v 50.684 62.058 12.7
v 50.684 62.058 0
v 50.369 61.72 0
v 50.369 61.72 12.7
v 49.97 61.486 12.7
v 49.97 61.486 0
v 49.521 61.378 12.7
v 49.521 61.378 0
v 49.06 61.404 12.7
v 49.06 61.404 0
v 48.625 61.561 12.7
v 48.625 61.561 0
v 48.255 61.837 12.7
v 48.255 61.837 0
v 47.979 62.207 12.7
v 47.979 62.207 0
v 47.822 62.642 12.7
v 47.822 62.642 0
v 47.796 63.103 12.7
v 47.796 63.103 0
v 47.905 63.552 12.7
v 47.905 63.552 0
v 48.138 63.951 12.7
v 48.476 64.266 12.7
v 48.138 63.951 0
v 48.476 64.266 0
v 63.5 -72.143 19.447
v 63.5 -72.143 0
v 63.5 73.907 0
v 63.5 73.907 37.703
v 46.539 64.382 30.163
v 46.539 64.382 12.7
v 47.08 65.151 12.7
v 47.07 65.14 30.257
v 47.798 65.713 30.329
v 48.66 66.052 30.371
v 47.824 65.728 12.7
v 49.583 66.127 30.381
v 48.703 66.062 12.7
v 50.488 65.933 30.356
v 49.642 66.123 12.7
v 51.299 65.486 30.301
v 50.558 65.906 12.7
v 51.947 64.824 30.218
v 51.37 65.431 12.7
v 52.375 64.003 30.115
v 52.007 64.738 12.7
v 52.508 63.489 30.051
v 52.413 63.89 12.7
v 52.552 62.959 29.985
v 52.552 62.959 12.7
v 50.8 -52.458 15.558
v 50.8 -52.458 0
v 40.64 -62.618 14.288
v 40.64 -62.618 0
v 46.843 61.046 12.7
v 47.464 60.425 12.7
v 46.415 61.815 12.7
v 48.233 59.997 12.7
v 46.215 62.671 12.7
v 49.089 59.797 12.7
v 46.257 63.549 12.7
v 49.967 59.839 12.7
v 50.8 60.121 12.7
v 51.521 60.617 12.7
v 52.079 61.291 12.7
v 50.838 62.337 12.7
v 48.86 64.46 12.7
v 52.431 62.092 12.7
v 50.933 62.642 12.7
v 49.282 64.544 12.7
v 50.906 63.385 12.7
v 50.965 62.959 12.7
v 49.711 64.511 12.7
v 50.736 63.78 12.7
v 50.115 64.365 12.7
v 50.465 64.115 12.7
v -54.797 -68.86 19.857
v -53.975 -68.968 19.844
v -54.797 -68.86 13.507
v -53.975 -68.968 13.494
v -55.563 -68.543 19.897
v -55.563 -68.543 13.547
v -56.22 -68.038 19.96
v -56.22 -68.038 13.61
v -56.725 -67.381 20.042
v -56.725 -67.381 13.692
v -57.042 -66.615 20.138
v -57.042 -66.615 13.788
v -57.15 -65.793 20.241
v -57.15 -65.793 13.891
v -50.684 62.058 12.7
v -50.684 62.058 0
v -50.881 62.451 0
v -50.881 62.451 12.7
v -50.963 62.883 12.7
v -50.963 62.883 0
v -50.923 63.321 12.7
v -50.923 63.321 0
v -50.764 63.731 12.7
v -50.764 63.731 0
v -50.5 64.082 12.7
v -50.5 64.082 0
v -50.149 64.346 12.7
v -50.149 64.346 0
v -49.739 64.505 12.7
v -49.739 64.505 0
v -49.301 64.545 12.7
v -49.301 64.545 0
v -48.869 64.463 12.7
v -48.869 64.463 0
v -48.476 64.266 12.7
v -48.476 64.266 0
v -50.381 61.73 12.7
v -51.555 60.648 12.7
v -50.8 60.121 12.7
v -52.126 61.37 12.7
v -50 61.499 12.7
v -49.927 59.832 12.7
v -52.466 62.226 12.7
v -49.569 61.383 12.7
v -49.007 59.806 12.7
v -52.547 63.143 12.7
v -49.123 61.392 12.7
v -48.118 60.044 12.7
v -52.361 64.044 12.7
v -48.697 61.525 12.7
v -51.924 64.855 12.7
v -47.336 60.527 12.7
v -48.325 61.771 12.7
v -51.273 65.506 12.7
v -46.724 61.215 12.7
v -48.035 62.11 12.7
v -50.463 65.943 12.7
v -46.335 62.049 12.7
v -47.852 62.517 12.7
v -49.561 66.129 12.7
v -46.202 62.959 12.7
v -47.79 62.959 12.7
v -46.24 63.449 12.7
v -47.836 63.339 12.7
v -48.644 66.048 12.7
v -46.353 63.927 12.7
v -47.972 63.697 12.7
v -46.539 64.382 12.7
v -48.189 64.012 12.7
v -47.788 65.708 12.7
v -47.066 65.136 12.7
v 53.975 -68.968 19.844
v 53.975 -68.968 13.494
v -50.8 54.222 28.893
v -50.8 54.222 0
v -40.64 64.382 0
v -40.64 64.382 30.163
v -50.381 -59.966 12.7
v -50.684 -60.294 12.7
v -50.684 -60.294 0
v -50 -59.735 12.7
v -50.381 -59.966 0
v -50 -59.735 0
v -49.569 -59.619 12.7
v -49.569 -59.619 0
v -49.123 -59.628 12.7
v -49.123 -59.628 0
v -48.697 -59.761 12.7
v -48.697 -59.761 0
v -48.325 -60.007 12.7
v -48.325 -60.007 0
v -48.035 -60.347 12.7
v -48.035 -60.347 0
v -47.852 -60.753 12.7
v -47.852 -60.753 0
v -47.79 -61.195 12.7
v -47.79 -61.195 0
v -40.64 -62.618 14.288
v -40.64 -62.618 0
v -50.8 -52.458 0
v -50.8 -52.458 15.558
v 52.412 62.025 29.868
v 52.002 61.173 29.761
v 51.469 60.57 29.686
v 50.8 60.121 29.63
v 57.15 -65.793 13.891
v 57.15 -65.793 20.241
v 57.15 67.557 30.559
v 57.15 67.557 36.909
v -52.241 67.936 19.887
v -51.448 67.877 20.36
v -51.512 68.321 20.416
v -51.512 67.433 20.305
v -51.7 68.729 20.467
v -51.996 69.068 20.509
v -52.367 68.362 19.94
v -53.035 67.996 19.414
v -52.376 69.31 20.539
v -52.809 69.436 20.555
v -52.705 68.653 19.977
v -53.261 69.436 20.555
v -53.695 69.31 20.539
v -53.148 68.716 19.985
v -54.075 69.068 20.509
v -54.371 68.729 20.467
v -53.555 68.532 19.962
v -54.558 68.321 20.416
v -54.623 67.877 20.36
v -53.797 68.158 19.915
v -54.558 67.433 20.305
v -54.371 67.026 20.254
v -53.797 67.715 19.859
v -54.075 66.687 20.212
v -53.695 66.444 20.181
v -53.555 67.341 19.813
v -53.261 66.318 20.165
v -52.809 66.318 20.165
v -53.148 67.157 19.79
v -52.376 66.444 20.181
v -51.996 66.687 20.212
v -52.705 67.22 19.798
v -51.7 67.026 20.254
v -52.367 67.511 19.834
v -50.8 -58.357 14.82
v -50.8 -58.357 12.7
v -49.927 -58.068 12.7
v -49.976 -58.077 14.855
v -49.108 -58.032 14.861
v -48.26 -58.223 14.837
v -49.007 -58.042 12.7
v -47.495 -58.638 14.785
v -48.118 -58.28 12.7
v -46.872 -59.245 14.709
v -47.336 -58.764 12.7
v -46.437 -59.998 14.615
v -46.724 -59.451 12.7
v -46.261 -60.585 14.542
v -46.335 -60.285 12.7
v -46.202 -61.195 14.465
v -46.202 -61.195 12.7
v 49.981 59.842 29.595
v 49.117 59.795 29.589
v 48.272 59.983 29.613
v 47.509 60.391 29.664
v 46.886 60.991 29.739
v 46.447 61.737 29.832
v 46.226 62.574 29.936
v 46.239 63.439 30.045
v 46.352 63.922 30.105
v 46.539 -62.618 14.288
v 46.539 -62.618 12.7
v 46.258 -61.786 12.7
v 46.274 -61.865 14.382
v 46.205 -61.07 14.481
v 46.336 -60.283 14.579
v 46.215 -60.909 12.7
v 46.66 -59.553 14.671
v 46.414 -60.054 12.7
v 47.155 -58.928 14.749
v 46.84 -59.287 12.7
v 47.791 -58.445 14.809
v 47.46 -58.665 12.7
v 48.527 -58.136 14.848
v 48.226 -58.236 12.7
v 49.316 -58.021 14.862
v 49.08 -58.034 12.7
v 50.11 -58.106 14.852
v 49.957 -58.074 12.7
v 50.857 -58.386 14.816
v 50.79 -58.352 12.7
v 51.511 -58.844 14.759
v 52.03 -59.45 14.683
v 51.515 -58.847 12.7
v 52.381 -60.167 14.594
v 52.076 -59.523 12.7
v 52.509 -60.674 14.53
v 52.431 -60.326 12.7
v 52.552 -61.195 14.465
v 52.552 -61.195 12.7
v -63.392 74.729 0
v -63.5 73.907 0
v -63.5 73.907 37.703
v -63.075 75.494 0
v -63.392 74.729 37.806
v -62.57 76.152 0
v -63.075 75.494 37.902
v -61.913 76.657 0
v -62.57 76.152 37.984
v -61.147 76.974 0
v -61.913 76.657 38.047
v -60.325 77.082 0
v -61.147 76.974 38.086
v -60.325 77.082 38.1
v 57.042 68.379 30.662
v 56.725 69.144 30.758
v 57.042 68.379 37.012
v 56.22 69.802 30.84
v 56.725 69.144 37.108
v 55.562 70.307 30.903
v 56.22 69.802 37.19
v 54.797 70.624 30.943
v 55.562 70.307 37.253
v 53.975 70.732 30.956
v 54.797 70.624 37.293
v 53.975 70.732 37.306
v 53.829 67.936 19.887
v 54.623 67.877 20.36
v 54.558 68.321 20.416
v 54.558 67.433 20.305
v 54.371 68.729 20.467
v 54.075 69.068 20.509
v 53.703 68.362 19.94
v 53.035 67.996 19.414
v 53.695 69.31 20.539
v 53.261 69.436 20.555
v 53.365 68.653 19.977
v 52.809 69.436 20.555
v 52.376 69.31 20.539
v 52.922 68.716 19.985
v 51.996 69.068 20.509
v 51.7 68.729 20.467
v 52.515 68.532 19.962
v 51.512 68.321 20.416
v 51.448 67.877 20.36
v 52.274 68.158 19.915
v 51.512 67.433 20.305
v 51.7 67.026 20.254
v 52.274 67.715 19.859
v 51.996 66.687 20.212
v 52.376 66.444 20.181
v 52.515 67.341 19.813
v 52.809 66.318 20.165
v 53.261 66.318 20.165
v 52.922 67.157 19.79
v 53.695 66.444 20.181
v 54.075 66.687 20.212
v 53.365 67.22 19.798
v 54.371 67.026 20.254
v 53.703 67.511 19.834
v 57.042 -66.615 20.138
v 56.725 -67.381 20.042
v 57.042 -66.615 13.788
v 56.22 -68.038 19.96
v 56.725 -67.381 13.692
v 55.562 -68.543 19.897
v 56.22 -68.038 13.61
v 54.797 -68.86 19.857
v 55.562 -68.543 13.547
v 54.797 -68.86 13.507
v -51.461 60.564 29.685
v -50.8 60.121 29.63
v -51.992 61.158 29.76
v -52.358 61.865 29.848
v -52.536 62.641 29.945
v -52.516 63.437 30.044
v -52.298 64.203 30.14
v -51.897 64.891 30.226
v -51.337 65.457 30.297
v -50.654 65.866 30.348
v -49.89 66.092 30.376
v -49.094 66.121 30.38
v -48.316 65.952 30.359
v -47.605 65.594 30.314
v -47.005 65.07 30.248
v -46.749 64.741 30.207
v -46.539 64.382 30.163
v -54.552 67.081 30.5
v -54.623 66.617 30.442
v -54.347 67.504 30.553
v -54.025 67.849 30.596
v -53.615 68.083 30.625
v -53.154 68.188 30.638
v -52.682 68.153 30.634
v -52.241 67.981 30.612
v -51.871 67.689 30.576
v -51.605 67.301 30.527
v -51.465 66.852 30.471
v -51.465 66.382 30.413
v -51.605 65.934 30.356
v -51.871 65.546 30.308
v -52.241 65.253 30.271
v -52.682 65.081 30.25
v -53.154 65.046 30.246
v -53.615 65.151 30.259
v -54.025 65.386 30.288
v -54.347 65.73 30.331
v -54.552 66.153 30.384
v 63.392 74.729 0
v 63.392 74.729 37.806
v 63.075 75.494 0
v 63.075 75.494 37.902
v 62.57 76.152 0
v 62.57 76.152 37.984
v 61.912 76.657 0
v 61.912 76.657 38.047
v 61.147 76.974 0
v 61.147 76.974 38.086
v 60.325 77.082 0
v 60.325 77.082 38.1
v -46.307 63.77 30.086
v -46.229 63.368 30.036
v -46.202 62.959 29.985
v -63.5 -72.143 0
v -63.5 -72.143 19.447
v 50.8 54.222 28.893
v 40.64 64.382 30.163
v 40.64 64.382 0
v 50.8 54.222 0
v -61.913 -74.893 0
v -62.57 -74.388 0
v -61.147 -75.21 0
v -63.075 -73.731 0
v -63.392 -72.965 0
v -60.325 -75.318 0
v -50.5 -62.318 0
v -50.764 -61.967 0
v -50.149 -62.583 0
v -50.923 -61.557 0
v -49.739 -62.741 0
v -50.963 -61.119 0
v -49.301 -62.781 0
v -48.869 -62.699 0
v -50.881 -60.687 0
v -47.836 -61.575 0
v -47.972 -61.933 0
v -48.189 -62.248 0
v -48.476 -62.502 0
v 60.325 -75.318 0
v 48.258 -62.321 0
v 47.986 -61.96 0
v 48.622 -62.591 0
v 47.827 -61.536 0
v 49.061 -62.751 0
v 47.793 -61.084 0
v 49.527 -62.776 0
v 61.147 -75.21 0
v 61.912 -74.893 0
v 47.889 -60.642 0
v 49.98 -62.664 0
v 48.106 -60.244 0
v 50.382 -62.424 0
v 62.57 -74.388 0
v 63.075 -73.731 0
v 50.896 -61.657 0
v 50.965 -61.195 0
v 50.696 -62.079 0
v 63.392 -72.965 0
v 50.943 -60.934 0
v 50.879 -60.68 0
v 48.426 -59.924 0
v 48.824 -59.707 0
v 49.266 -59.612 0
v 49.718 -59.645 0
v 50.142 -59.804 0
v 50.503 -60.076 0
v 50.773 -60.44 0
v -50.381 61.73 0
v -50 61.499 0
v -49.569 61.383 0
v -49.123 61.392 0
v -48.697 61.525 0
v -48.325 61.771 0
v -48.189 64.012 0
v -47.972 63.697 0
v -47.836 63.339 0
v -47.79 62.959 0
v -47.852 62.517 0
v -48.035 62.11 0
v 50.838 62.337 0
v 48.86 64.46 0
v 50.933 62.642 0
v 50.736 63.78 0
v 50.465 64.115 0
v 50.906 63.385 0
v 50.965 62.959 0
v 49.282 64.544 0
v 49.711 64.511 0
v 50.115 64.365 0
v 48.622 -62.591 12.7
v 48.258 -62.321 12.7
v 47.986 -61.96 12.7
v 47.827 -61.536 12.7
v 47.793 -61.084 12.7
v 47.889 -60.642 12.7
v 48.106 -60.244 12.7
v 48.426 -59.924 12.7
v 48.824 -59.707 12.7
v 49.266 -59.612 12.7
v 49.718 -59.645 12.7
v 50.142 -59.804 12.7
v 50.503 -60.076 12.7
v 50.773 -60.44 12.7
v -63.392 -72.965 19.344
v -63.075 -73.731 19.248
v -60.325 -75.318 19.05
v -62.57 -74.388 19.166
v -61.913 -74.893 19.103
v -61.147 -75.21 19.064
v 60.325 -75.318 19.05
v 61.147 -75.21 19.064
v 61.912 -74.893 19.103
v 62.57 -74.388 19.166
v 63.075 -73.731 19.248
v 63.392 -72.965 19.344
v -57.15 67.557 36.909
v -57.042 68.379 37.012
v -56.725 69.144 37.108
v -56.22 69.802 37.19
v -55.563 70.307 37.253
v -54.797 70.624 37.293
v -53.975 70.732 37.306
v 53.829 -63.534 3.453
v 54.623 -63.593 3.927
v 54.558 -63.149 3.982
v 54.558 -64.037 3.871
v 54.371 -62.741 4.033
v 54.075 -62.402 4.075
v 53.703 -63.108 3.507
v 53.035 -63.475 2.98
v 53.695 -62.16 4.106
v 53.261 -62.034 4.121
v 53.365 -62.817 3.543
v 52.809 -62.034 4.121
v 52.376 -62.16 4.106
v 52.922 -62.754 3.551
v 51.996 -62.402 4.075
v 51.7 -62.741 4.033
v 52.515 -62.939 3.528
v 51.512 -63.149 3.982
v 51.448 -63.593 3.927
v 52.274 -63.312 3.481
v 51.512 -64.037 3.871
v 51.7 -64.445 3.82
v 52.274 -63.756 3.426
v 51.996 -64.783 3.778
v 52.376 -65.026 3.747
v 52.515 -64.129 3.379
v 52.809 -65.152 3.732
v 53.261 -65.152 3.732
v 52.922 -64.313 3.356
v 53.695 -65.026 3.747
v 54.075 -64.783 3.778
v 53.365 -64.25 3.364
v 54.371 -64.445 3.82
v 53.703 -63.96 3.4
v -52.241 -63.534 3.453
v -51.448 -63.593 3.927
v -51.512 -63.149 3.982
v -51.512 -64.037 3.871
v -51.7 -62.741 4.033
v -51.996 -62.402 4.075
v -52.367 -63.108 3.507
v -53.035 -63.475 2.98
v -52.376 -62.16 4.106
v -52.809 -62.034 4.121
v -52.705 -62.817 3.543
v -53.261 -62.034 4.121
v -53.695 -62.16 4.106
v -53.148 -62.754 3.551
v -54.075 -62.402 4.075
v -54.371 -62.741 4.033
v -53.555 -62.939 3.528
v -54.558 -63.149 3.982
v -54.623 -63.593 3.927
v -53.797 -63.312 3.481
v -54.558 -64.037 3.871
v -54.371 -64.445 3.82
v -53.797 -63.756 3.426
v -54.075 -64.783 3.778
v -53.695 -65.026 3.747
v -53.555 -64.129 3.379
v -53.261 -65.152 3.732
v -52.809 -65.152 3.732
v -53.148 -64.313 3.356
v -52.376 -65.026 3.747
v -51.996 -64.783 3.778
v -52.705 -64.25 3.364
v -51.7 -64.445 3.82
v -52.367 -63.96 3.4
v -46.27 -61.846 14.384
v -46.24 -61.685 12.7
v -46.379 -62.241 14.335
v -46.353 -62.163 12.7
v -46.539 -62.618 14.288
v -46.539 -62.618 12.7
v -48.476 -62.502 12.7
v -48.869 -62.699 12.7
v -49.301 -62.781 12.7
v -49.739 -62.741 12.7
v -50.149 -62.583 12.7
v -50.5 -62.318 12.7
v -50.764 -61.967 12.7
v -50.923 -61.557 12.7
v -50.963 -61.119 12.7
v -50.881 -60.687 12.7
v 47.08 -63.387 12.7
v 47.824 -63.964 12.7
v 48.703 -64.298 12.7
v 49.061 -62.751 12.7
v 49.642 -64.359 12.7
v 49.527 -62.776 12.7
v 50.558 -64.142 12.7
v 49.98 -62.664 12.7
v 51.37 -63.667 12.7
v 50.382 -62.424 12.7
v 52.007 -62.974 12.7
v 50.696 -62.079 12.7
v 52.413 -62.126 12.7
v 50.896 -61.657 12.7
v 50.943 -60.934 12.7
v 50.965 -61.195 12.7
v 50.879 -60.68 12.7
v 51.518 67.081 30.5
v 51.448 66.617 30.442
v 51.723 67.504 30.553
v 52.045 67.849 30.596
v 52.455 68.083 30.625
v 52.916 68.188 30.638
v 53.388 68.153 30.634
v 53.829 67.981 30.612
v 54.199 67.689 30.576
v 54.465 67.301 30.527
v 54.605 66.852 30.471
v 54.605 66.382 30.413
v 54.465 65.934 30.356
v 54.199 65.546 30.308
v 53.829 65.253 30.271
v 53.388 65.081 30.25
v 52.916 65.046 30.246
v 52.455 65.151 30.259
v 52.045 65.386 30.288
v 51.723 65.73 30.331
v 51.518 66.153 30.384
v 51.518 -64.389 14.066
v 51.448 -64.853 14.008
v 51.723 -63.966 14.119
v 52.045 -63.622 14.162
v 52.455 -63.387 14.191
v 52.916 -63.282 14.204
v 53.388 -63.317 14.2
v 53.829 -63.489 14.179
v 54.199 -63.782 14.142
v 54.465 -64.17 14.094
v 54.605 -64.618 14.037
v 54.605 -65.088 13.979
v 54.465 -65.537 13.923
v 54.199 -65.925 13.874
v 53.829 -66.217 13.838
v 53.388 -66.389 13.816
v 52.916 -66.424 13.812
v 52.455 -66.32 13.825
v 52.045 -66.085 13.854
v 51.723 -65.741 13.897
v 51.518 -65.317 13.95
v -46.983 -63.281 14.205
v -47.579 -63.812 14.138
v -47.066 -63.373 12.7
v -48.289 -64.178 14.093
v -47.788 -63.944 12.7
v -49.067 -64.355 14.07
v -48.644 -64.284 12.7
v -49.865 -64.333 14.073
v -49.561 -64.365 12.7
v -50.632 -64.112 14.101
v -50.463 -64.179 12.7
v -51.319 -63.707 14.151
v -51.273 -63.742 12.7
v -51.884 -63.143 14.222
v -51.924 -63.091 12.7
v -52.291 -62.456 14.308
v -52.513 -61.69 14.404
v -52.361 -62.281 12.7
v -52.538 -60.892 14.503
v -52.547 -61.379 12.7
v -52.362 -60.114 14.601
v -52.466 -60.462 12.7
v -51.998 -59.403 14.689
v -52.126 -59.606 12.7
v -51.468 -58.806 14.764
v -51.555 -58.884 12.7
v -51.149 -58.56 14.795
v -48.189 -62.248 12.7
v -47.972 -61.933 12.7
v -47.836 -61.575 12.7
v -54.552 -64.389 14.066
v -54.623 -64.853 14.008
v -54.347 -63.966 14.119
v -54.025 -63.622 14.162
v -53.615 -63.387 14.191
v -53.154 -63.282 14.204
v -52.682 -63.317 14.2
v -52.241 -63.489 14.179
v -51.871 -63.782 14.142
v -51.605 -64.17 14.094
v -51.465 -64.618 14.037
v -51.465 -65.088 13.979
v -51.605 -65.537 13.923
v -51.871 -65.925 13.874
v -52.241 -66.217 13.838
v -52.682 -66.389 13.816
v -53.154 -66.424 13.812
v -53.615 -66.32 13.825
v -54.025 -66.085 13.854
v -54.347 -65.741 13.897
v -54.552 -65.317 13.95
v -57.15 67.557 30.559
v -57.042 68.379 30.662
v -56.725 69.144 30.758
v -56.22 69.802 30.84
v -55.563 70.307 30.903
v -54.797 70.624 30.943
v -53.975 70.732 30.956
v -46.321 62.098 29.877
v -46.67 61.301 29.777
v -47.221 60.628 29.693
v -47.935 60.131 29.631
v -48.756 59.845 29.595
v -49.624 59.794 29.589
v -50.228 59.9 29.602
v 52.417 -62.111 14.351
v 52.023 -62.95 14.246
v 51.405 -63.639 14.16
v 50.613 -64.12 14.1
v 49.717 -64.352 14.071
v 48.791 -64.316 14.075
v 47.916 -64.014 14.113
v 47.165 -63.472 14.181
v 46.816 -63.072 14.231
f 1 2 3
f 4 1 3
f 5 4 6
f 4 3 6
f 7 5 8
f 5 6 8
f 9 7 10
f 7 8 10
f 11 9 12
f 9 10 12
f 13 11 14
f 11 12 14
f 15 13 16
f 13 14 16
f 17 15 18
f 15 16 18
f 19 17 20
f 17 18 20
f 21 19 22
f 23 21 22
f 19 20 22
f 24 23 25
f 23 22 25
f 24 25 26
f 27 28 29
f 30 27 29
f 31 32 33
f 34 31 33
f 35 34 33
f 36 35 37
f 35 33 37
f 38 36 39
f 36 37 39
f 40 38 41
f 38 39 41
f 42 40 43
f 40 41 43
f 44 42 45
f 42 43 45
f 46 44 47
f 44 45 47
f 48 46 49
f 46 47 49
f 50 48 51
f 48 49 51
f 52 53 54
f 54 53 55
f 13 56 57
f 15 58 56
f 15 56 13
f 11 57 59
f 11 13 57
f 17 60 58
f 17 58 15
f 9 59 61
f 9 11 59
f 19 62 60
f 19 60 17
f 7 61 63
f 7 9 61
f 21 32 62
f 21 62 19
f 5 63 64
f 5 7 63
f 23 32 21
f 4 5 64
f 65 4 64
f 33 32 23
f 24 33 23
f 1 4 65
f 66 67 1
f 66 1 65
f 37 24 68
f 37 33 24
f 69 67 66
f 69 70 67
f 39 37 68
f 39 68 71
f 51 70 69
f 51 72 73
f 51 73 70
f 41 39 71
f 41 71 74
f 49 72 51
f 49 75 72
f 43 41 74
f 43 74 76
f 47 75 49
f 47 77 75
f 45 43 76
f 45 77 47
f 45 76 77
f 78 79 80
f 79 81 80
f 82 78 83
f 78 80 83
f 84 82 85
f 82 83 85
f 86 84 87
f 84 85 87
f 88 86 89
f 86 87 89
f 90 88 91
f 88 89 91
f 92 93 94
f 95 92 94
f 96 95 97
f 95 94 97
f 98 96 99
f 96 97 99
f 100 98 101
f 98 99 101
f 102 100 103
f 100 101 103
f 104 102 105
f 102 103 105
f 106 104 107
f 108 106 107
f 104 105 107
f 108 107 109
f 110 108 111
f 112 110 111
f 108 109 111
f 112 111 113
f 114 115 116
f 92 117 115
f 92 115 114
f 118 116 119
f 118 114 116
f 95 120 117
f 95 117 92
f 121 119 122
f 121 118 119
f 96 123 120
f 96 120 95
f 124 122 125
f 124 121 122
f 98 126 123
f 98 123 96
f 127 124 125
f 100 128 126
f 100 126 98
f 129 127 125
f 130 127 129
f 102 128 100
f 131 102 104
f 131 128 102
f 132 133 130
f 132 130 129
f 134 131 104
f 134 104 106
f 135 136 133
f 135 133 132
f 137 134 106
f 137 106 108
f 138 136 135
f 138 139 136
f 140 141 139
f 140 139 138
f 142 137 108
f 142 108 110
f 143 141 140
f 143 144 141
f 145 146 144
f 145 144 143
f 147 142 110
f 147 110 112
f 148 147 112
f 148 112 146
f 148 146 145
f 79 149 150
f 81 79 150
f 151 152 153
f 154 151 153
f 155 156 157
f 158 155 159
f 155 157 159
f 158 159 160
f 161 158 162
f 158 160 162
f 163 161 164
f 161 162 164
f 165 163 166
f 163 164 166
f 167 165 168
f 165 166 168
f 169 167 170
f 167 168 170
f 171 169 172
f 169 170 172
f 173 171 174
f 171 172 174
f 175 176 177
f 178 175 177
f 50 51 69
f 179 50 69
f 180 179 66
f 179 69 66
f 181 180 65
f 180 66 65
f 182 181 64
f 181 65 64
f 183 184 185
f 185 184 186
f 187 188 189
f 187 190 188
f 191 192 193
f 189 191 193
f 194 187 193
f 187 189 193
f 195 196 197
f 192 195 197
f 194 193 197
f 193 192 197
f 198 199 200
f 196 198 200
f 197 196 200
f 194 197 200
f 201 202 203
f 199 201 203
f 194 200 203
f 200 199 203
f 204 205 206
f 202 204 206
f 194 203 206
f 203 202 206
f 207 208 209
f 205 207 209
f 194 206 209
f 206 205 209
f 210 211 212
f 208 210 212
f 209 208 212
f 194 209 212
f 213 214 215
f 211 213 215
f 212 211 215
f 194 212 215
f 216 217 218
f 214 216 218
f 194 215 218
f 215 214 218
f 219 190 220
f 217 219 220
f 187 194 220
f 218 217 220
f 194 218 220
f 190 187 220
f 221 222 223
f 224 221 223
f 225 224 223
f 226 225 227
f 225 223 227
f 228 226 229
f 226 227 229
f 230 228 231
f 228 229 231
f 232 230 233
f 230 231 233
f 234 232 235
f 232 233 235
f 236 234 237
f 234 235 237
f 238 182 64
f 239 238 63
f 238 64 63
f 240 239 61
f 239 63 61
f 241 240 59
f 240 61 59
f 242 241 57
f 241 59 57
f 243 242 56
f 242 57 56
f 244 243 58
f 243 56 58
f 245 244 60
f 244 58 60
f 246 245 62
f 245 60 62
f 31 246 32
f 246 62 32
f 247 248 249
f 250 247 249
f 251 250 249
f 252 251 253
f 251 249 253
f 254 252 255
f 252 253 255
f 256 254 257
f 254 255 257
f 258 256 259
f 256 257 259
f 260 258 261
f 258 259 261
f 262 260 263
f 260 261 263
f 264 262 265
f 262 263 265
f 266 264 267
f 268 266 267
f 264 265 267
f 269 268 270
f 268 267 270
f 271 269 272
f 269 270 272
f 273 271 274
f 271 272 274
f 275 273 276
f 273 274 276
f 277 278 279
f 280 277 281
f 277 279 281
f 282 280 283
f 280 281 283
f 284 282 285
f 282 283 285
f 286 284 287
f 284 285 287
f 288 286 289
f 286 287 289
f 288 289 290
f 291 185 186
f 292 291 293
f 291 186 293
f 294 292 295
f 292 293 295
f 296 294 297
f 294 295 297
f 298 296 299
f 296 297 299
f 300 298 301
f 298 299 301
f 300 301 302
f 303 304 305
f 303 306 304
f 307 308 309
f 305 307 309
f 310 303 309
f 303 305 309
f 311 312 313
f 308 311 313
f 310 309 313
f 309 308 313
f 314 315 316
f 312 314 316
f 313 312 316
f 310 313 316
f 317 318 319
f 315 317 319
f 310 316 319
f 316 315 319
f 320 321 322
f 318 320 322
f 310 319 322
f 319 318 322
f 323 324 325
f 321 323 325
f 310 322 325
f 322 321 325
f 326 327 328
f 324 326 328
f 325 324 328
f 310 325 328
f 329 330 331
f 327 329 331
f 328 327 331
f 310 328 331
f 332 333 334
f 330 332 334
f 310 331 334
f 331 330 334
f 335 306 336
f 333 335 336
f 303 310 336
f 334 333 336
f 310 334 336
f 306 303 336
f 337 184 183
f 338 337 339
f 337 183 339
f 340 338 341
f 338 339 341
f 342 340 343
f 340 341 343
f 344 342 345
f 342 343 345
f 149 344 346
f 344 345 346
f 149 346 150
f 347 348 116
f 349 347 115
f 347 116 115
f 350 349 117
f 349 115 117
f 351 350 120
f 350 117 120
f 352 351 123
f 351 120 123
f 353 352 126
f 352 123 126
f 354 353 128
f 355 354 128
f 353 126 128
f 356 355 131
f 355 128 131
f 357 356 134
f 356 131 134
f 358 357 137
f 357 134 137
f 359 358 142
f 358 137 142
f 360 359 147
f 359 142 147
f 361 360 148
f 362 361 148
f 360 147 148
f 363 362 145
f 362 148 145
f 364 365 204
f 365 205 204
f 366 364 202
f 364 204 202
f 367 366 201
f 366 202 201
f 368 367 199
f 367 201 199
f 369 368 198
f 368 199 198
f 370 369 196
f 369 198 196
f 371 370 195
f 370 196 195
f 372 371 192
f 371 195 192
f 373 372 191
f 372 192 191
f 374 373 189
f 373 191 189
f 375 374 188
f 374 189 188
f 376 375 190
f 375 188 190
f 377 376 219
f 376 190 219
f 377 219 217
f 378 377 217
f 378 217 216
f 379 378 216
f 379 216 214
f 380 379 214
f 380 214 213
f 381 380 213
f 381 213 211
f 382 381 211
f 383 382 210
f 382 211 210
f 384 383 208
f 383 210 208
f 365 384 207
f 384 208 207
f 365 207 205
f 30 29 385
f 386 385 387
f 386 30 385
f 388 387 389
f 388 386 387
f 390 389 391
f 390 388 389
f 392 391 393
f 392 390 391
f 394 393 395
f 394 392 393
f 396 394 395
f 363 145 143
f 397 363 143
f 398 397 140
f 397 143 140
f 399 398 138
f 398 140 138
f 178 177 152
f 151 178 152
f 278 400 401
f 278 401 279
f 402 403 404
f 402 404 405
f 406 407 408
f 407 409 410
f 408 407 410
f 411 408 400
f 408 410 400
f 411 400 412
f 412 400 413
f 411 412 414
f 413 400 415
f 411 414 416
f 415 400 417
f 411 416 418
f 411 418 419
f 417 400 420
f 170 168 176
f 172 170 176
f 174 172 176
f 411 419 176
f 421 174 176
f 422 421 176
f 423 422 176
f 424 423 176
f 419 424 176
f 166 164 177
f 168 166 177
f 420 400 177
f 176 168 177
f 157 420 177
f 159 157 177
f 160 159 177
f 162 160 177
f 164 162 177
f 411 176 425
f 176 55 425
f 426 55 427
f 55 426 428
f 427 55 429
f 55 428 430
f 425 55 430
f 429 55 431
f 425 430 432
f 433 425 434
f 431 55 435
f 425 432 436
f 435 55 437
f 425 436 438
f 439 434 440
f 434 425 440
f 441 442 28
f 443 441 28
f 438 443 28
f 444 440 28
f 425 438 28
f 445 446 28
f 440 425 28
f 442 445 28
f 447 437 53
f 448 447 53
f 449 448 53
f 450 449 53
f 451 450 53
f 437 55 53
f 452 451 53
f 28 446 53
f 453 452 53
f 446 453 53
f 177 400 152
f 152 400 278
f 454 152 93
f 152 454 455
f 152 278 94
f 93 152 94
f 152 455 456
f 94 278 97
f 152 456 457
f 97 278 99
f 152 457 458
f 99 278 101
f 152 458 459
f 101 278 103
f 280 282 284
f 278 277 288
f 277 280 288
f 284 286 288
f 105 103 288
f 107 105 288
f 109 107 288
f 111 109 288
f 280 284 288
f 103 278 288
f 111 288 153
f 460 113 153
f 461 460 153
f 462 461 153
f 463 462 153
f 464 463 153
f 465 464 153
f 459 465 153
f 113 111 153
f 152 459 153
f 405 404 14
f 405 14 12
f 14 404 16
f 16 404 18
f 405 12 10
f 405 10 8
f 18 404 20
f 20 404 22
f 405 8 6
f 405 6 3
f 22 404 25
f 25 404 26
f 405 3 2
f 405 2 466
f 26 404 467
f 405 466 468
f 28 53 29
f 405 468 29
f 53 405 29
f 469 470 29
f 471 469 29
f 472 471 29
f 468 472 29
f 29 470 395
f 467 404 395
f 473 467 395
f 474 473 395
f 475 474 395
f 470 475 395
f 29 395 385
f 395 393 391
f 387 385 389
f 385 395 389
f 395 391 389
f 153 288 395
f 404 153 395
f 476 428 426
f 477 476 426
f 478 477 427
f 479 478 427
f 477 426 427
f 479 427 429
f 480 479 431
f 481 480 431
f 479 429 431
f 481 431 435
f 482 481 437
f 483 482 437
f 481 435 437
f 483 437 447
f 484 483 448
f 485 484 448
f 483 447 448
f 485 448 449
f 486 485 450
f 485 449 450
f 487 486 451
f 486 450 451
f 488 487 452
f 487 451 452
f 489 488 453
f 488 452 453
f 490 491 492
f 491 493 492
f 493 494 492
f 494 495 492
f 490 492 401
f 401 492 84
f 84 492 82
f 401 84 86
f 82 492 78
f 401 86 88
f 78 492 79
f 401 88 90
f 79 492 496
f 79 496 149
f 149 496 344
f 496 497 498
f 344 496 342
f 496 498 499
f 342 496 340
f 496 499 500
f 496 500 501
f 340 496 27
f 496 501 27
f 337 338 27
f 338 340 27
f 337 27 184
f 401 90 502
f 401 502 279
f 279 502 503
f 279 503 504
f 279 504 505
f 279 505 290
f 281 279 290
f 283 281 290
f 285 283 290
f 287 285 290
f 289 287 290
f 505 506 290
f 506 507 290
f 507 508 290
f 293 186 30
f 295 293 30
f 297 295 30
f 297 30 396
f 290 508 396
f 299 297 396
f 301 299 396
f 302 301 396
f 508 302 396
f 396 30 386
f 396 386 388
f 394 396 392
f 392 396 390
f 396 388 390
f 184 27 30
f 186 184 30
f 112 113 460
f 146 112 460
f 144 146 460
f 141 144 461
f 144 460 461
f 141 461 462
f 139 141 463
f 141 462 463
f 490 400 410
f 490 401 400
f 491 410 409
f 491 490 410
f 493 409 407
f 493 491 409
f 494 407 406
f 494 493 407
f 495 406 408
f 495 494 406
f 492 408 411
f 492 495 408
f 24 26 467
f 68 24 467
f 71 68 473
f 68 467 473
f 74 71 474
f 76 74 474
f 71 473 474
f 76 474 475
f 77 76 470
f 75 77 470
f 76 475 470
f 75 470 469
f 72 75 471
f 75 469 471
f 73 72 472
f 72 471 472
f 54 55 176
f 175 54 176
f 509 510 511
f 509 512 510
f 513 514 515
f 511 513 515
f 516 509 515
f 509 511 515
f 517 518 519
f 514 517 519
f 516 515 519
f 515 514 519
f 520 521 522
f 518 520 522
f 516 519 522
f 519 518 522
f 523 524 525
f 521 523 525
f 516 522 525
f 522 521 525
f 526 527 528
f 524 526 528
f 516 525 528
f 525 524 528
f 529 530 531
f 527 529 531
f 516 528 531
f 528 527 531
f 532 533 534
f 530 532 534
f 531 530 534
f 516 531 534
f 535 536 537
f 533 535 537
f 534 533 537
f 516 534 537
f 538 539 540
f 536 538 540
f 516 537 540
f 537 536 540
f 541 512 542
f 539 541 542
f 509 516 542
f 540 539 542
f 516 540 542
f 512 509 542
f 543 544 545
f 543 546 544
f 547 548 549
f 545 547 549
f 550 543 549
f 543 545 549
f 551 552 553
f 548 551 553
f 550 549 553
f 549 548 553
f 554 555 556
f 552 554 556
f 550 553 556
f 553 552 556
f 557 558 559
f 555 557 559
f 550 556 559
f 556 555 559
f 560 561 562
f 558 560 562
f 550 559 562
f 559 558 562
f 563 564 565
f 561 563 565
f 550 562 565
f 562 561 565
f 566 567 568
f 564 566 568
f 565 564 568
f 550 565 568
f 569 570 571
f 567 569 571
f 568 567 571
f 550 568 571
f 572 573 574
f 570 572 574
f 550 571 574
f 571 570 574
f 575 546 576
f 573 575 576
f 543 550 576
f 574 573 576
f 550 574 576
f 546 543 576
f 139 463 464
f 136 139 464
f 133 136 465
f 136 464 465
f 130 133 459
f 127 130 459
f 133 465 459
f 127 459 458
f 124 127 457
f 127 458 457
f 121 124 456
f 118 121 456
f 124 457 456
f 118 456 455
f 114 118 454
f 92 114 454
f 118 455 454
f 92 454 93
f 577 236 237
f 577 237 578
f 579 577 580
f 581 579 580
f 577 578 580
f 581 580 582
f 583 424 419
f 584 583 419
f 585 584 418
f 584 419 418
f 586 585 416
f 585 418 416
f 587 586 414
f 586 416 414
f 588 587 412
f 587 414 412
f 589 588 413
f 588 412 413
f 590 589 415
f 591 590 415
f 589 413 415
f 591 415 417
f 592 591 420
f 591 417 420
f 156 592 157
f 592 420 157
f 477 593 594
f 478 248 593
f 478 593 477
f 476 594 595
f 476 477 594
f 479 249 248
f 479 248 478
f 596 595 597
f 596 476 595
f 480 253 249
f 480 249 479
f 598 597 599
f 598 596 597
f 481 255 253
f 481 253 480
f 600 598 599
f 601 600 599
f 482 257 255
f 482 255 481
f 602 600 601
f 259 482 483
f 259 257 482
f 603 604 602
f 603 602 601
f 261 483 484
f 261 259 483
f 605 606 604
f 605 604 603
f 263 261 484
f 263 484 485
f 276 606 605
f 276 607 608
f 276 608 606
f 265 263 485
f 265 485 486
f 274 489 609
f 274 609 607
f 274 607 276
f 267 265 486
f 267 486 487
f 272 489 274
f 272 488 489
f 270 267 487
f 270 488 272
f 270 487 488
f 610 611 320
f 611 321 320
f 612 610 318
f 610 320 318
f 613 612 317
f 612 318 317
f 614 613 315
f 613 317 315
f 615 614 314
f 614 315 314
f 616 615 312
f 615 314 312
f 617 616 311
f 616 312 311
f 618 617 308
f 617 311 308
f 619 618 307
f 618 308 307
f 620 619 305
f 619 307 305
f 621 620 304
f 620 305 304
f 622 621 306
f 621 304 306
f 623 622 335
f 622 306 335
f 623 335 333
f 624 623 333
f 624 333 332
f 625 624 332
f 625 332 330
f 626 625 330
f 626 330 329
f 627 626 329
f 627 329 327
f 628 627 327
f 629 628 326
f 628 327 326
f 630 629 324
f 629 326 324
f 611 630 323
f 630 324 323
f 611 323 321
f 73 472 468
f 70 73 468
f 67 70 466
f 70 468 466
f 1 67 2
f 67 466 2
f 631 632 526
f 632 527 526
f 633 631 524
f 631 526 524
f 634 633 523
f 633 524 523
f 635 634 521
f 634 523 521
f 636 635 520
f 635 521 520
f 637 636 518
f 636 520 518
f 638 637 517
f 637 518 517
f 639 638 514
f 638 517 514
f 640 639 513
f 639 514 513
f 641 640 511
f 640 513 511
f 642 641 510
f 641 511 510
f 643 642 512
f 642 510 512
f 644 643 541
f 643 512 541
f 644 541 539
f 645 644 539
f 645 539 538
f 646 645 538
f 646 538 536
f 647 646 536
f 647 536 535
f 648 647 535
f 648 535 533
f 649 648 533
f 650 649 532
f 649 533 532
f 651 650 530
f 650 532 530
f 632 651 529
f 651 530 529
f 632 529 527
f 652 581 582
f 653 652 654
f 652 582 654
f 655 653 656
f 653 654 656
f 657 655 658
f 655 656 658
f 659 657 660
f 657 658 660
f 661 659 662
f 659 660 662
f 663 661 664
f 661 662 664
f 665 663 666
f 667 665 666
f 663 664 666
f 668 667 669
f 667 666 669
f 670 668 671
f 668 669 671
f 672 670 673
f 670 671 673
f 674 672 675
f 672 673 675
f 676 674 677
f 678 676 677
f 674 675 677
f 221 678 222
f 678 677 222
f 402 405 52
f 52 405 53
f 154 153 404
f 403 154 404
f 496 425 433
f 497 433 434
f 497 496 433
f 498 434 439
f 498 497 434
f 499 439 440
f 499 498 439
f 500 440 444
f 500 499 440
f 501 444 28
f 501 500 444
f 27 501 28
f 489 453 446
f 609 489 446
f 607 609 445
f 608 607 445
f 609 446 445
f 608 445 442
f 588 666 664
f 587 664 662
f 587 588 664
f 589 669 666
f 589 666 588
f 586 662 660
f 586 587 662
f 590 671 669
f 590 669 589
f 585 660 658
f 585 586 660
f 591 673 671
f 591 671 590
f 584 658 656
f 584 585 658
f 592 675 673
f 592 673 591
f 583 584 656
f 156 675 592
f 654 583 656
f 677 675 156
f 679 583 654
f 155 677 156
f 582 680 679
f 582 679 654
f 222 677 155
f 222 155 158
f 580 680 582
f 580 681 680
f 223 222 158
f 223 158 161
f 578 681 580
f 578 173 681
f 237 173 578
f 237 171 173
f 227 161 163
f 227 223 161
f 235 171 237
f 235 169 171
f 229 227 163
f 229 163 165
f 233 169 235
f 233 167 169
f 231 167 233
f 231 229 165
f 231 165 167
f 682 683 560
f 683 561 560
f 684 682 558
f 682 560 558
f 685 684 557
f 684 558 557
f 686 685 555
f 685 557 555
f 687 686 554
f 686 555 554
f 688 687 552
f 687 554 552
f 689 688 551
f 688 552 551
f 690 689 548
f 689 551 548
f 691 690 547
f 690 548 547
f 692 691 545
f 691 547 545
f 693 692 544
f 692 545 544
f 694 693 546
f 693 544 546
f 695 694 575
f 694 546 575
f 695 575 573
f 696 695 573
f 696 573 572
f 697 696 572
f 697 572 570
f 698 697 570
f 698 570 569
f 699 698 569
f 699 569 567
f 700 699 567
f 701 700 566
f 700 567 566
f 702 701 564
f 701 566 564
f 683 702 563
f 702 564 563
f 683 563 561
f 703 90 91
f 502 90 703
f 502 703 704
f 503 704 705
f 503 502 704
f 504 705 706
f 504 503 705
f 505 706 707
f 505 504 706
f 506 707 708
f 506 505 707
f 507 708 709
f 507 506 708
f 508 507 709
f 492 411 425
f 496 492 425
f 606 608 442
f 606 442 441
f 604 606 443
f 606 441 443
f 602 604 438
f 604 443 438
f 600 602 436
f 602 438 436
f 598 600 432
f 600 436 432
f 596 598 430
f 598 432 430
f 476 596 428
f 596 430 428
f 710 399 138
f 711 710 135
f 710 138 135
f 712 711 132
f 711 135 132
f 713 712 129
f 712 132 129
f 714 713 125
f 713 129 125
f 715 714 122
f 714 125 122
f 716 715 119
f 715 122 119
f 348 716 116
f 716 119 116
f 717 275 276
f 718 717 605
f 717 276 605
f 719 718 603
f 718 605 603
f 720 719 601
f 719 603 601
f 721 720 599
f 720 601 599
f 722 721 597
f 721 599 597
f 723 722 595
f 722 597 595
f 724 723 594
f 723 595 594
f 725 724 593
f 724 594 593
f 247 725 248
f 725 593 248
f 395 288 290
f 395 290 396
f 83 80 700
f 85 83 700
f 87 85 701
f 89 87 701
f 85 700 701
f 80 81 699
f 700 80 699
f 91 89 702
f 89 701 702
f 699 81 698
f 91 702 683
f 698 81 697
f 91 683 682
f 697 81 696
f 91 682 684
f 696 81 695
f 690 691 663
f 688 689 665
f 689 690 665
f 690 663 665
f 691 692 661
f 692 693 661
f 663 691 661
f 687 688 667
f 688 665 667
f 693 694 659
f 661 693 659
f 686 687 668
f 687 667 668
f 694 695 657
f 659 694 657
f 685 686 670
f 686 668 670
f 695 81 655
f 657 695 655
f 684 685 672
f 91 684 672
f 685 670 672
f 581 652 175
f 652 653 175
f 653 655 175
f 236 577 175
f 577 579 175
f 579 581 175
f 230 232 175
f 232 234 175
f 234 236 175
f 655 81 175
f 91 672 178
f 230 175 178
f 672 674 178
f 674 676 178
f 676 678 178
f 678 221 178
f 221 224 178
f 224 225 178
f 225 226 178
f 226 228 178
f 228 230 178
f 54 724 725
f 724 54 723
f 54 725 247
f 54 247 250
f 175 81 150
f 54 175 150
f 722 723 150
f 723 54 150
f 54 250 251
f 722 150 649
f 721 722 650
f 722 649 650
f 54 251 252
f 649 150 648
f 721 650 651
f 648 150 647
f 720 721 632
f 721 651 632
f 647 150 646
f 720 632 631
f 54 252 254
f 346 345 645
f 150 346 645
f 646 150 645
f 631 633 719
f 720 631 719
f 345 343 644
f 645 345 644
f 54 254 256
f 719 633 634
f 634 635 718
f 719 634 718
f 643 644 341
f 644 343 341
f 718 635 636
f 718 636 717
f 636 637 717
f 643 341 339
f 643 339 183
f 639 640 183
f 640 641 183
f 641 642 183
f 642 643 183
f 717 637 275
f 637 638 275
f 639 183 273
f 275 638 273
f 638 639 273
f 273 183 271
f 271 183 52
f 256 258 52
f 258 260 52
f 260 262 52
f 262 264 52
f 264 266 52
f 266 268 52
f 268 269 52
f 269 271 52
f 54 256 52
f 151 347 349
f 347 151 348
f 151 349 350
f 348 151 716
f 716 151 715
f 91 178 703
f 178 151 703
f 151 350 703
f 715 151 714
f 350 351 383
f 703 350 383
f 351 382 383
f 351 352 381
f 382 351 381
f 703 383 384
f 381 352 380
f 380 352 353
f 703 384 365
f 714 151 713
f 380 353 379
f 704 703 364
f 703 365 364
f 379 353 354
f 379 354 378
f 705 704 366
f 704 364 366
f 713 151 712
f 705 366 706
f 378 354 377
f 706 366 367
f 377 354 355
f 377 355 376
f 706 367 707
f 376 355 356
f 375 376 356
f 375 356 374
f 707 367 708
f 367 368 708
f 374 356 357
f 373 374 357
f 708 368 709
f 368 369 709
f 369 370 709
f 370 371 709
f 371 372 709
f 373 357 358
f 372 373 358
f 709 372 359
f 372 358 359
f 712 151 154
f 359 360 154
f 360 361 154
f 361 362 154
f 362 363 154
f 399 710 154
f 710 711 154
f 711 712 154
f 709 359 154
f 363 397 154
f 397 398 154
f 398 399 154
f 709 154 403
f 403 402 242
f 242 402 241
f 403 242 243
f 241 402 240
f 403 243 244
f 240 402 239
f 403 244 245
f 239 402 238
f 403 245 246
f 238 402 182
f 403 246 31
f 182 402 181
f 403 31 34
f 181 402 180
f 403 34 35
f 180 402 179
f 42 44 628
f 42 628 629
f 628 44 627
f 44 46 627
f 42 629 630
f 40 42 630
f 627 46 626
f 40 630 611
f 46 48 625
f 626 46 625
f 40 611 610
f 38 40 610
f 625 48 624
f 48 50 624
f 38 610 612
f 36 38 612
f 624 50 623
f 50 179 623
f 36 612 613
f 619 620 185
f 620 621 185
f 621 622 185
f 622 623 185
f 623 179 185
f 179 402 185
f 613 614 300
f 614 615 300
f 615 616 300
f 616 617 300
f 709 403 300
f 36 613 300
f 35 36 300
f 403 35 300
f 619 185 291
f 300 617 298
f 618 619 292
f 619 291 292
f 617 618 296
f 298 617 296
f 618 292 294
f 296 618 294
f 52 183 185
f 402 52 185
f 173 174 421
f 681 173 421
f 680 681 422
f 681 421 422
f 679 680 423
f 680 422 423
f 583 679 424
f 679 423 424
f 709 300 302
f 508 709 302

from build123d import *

# Parameters (mm, degrees)
F0_W     = 127
F0_H     = 152.4
F0_R     = 1.5875
F1_DEPTH = 76.2
F3_DEPTH = 133.858
F4_DEPTH = 12.7
F6_START = -6.35
F6_DEPTH = 114.3
F8_D     = 3.175
F8_DEPTH = 10.16
F8_TIP   = 0.9538662327
F9_R     = 3.175


with BuildPart() as f1:
    # F0 (on Top) → F1 (new body)
    with BuildSketch(Plane.XY):
        with Locations((-4.7115e-06, 0.8819496805)):
            Rectangle(F0_W, F0_H)
        with BuildLine():
            ThreePointArc((-57.1500047115, 67.5569496805), (-56.2200687418, 69.8020137107), (-53.9750047115, 70.7319496805))
            Line((-53.9750047115, 70.7319496805), (53.9749952885, 70.7319496805))
            ThreePointArc((53.9749952885, 70.7319496805), (56.2200593188, 69.8020137107), (57.1499952885, 67.5569496805))
            Line((57.1499952885, 67.5569496805), (57.1499952885, -65.7930503195))
            ThreePointArc((57.1499952885, -65.7930503195), (56.2200593188, -68.0381143498), (53.9749952885, -68.9680503195))
            Line((53.9749952885, -68.9680503195), (-53.9750047115, -68.9680503195))
            ThreePointArc((-53.9750047115, -68.9680503195), (-56.2200687418, -68.0381143498), (-57.1500047115, -65.7930503195))
            Line((-57.1500047115, -65.7930503195), (-57.1500047115, 67.5569496805))
        make_face(mode=Mode.SUBTRACT)
        with BuildLine():
            Line((53.9749952885, 70.7319496805), (-53.9750047115, 70.7319496805))
            ThreePointArc((-53.9750047115, 70.7319496805), (-56.2200687418, 69.8020137107), (-57.1500047115, 67.5569496805))
            Line((-57.1500047115, 67.5569496805), (-57.1500047115, -65.7930503195))
            ThreePointArc((-57.1500047115, -65.7930503195), (-56.2200687418, -68.0381143498), (-53.9750047115, -68.9680503195))
            Line((-53.9750047115, -68.9680503195), (53.9749952885, -68.9680503195))
            ThreePointArc((53.9749952885, -68.9680503195), (56.2200593188, -68.0381143498), (57.1499952885, -65.7930503195))
            Line((57.1499952885, -65.7930503195), (57.1499952885, 67.5569496805))
            ThreePointArc((57.1499952885, 67.5569496805), (56.2200593188, 69.8020137107), (53.9749952885, 70.7319496805))
        make_face()
        with Locations((-53.0410580749, -64.8591036829)):
            Circle(F0_R, mode=Mode.SUBTRACT)
        with Locations((53.0410486519, -64.8591036829)):
            Circle(F0_R, mode=Mode.SUBTRACT)
        with BuildLine():
            Line((-46.5388031962, 64.3819496805), (-40.6400047115, 64.3819496805))
            Line((-40.6400047115, 64.3819496805), (40.6399952885, 64.3819496805))
            Line((40.6399952885, 64.3819496805), (46.5387937732, 64.3819496805))
            ThreePointArc((46.5387937732, 64.3819496805), (50.1081956465, 66.0487397971), (52.5521041545, 62.9590585465))
            ThreePointArc((52.5521041545, 62.9590585465), (52.0787984702, 61.2912837341), (50.7999952885, 60.1207481652))
            Line((50.7999952885, 60.1207481652), (50.7999952885, 54.2219496805))
            Line((50.7999952885, 54.2219496805), (50.7999952885, -52.4580503195))
            Line((50.7999952885, -52.4580503195), (50.7999952885, -58.3568488042))
            ThreePointArc((50.7999952885, -58.3568488042), (52.0787984702, -59.5273843732), (52.5521041545, -61.1951591855))
            ThreePointArc((52.5521041545, -61.1951591855), (50.1081956465, -64.2848404361), (46.5387937732, -62.6180503195))
            Line((46.5387937732, -62.6180503195), (40.6399952885, -62.6180503195))
            Line((40.6399952885, -62.6180503195), (-40.6400047115, -62.6180503195))
            Line((-40.6400047115, -62.6180503195), (-46.5388031962, -62.6180503195))
            ThreePointArc((-46.5388031962, -62.6180503195), (-51.6221776078, -63.4402232158), (-50.8000047115, -58.3568488042))
            Line((-50.8000047115, -58.3568488042), (-50.8000047115, -52.4580503195))
            Line((-50.8000047115, -52.4580503195), (-50.8000047115, 54.2219496805))
            Line((-50.8000047115, 54.2219496805), (-50.8000047115, 60.1207481652))
            ThreePointArc((-50.8000047115, 60.1207481652), (-51.6221776078, 65.2041225768), (-46.5388031962, 64.3819496805))
        make_face(mode=Mode.SUBTRACT)
        with Locations((-53.0410580749, 66.6230030439)):
            Circle(F0_R, mode=Mode.SUBTRACT)
        with Locations((53.0410486519, 66.6230030439)):
            Circle(F0_R, mode=Mode.SUBTRACT)
        with BuildLine():
            Line((-50.8000047115, 54.2219496805), (-40.6400047115, 64.3819496805))
            Line((-40.6400047115, 64.3819496805), (-46.5388031962, 64.3819496805))
            ThreePointArc((-46.5388031962, 64.3819496805), (-46.2874323269, 63.6901500385), (-46.2021135775, 62.9590585465))
            ThreePointArc((-46.2021135775, 62.9590585465), (-47.7093387651, 60.2573642308), (-50.8000047115, 60.1207481652))
            Line((-50.8000047115, 60.1207481652), (-50.8000047115, 54.2219496805))
        make_face()
        with BuildLine():
            Line((46.5387937732, 64.3819496805), (40.6399952885, 64.3819496805))
            Line((40.6399952885, 64.3819496805), (50.7999952885, 54.2219496805))
            Line((50.7999952885, 54.2219496805), (50.7999952885, 60.1207481652))
            ThreePointArc((50.7999952885, 60.1207481652), (47.1320401243, 60.7139945162), (46.5387937732, 64.3819496805))
        make_face()
        with BuildLine():
            Line((50.7999952885, -58.3568488042), (50.7999952885, -52.4580503195))
            Line((50.7999952885, -52.4580503195), (40.6399952885, -62.6180503195))
            Line((40.6399952885, -62.6180503195), (46.5387937732, -62.6180503195))
            ThreePointArc((46.5387937732, -62.6180503195), (47.1320401243, -58.9500951553), (50.7999952885, -58.3568488042))
        make_face()
        with BuildLine():
            Line((-40.6400047115, -62.6180503195), (-50.8000047115, -52.4580503195))
            Line((-50.8000047115, -52.4580503195), (-50.8000047115, -58.3568488042))
            ThreePointArc((-50.8000047115, -58.3568488042), (-47.7093387651, -58.4934648699), (-46.2021135775, -61.1951591855))
            ThreePointArc((-46.2021135775, -61.1951591855), (-46.2874323269, -61.9262506775), (-46.5388031962, -62.6180503195))
            Line((-46.5388031962, -62.6180503195), (-40.6400047115, -62.6180503195))
        make_face()
        with Locations((53.0410486519, 66.6230030439)):
            Circle(F0_R)
        with Locations((-53.0410580749, 66.6230030439)):
            Circle(F0_R)
        with Locations((53.0410486519, -64.8591036829)):
            Circle(F0_R)
        with Locations((-53.0410580749, -64.8591036829)):
            Circle(F0_R)
    extrude(amount=F1_DEPTH)

    # F2 (on face) → F3 (cut)
    with BuildSketch(Plane.YZ.offset(63.4999952885)):
        Polygon((77.0819496805, 38.1), (77.1753489971, 82.9634442925), (-75.3835588694, 82.9634442925), (-75.3180503195, 19.05), align=None)
    extrude(amount=-F3_DEPTH, mode=Mode.SUBTRACT)

    # F0 (on Top) → F4 (join)
    with BuildSketch(Plane.XY):
        with BuildLine():
            ThreePointArc((-46.2021135775, 62.9590585465), (-46.2874323269, 63.6901500385), (-46.5388031962, 64.3819496805))
            Line((-46.5388031962, 64.3819496805), (-47.6250047115, 64.3819496805))
            ThreePointArc((-47.6250047115, 64.3819496805), (-48.0543198265, 64.3527903522), (-48.4757492467, 64.2658479684))
            ThreePointArc((-48.4757492467, 64.2658479684), (-47.9715759357, 63.6970424131), (-47.7896135775, 62.9590585465))
            ThreePointArc((-47.7896135775, 62.9590585465), (-48.9050817763, 61.4433599522), (-50.6839029994, 62.0576942157))
            ThreePointArc((-50.6839029994, 62.0576942157), (-50.7708453832, 61.6362647954), (-50.8000047115, 61.2069496805))
            Line((-50.8000047115, 61.2069496805), (-50.8000047115, 60.1207481652))
            ThreePointArc((-50.8000047115, 60.1207481652), (-47.7093387651, 60.2573642308), (-46.2021135775, 62.9590585465))
        make_face()
        with BuildLine():
            Line((-47.6250047115, 64.3819496805), (-46.5388031962, 64.3819496805))
            ThreePointArc((-46.5388031962, 64.3819496805), (-51.6221776078, 65.2041225768), (-50.8000047115, 60.1207481652))
            Line((-50.8000047115, 60.1207481652), (-50.8000047115, 61.2069496805))
            ThreePointArc((-50.8000047115, 61.2069496805), (-50.7708453832, 61.6362647954), (-50.6839029994, 62.0576942157))
            ThreePointArc((-50.6839029994, 62.0576942157), (-50.4996455926, 64.0815905616), (-48.4757492467, 64.2658479684))
            ThreePointArc((-48.4757492467, 64.2658479684), (-48.0543198265, 64.3527903522), (-47.6250047115, 64.3819496805))
        make_face()
        with BuildLine():
            Line((47.6249952885, 64.3819496805), (46.5387937732, 64.3819496805))
            ThreePointArc((46.5387937732, 64.3819496805), (47.1320401243, 60.7139945162), (50.7999952885, 60.1207481652))
            Line((50.7999952885, 60.1207481652), (50.7999952885, 61.2069496805))
            ThreePointArc((50.7999952885, 61.2069496805), (50.7708359603, 61.6362647954), (50.6838935764, 62.0576942157))
            ThreePointArc((50.6838935764, 62.0576942157), (48.2545721394, 61.8365265314), (48.4757398237, 64.2658479684))
            ThreePointArc((48.4757398237, 64.2658479684), (48.0543104035, 64.3527903522), (47.6249952885, 64.3819496805))
        make_face()
        with BuildLine():
            ThreePointArc((52.5521041545, 62.9590585465), (50.1081956465, 66.0487397971), (46.5387937732, 64.3819496805))
            Line((46.5387937732, 64.3819496805), (47.6249952885, 64.3819496805))
            ThreePointArc((47.6249952885, 64.3819496805), (48.0543104035, 64.3527903522), (48.4757398237, 64.2658479684))
            ThreePointArc((48.4757398237, 64.2658479684), (50.1150880212, 64.3645961883), (50.9646041545, 62.9590585465))
            ThreePointArc((50.9646041545, 62.9590585465), (50.8928027488, 62.4870267453), (50.6838935764, 62.0576942157))
            ThreePointArc((50.6838935764, 62.0576942157), (50.7708359603, 61.6362647954), (50.7999952885, 61.2069496805))
            Line((50.7999952885, 61.2069496805), (50.7999952885, 60.1207481652))
            ThreePointArc((50.7999952885, 60.1207481652), (52.0787984702, 61.2912837341), (52.5521041545, 62.9590585465))
        make_face()
        with BuildLine():
            ThreePointArc((52.5521041545, -61.1951591855), (52.0787984702, -59.5273843732), (50.7999952885, -58.3568488042))
            Line((50.7999952885, -58.3568488042), (50.7999952885, -60.0726271704))
            ThreePointArc((50.7999952885, -60.0726271704), (50.7933316222, -60.2566904654), (50.7733755129, -60.4397900414))
            ThreePointArc((50.7733755129, -60.4397900414), (50.9160546137, -60.8055597318), (50.9646041545, -61.1951591855))
            ThreePointArc((50.9646041545, -61.1951591855), (50.1898180444, -62.5588499068), (48.6217350104, -62.5914305439))
            ThreePointArc((48.6217350104, -62.5914305439), (48.4386354344, -62.6113866532), (48.2545721394, -62.6180503195))
            Line((48.2545721394, -62.6180503195), (46.5387937732, -62.6180503195))
            ThreePointArc((46.5387937732, -62.6180503195), (50.1081956465, -64.2848404361), (52.5521041545, -61.1951591855))
        make_face()
        with BuildLine():
            Line((50.7999952885, -60.0726271704), (50.7999952885, -58.3568488042))
            ThreePointArc((50.7999952885, -58.3568488042), (47.1320401243, -58.9500951553), (46.5387937732, -62.6180503195))
            Line((46.5387937732, -62.6180503195), (48.2545721394, -62.6180503195))
            ThreePointArc((48.2545721394, -62.6180503195), (48.4386354344, -62.6113866532), (48.6217350104, -62.5914305439))
            ThreePointArc((48.6217350104, -62.5914305439), (48.2545721394, -60.0726271704), (50.7733755129, -60.4397900414))
            ThreePointArc((50.7733755129, -60.4397900414), (50.7933316222, -60.2566904654), (50.7999952885, -60.0726271704))
        make_face()
        with BuildLine():
            Line((-50.8000047115, -59.4430503195), (-50.8000047115, -58.3568488042))
            ThreePointArc((-50.8000047115, -58.3568488042), (-51.6221776078, -63.4402232158), (-46.5388031962, -62.6180503195))
            Line((-46.5388031962, -62.6180503195), (-47.6250047115, -62.6180503195))
            ThreePointArc((-47.6250047115, -62.6180503195), (-48.0543198265, -62.5888909913), (-48.4757492467, -62.5019486074))
            ThreePointArc((-48.4757492467, -62.5019486074), (-50.4996455926, -62.3176912007), (-50.6839029994, -60.2937948547))
            ThreePointArc((-50.6839029994, -60.2937948547), (-50.7708453832, -59.8723654345), (-50.8000047115, -59.4430503195))
        make_face()
        with BuildLine():
            ThreePointArc((-46.2021135775, -61.1951591855), (-47.7093387651, -58.4934648699), (-50.8000047115, -58.3568488042))
            Line((-50.8000047115, -58.3568488042), (-50.8000047115, -59.4430503195))
            ThreePointArc((-50.8000047115, -59.4430503195), (-50.7708453832, -59.8723654345), (-50.6839029994, -60.2937948547))
            ThreePointArc((-50.6839029994, -60.2937948547), (-48.9050817763, -59.6794605913), (-47.7896135775, -61.1951591855))
            ThreePointArc((-47.7896135775, -61.1951591855), (-47.9715759357, -61.9331430522), (-48.4757492467, -62.5019486074))
            ThreePointArc((-48.4757492467, -62.5019486074), (-48.0543198265, -62.5888909913), (-47.6250047115, -62.6180503195))
            Line((-47.6250047115, -62.6180503195), (-46.5388031962, -62.6180503195))
            ThreePointArc((-46.5388031962, -62.6180503195), (-46.2874323269, -61.9262506775), (-46.2021135775, -61.1951591855))
        make_face()
    extrude(amount=F4_DEPTH)

    # F5 (on face) → F6 (cut)
    with BuildSketch(Plane.YZ.offset(63.4999952885).offset(F6_START)):
        Polygon((70.7319496805, 37.30625), (-68.9680503195, 19.84375), (-68.9680503195, 13.49375), (70.7319496805, 30.9562500008), align=None)
    extrude(amount=-F6_DEPTH, mode=Mode.SUBTRACT)

    # F8
    with Locations(Plane(origin=(0, -2.7218161589, 21.7745292705), x_dir=(1, 0, 0), z_dir=(0, -0.1240347346, 0.9922778767))):
        with Locations((-53.0351293557, 69.8785008825), (53.0351199327, 69.8785008825), (53.0351199327, -62.6148786171), (-53.0351293557, -62.6148786171)):
            Hole(F8_D / 2, depth=F8_DEPTH)
            with Locations((0, 0, -(F8_DEPTH + F8_TIP / 2))):  # 118° drill point
                Cone(0, F8_D / 2, F8_TIP, mode=Mode.SUBTRACT)

    # F9
    f9_edges = [f1.edges().sort_by_distance(p)[0] for p in [
        (63.499995, 77.08195, 19.05),
        (-63.500005, 77.08195, 19.05),
        (63.499995, -75.31805, 9.525),
        (-63.500005, -75.31805, 9.525),
        (-57.150005, 70.73195, 34.13125),
        (57.149995, 70.73195, 34.13125),
        (-57.150005, -68.96805, 16.66875),
        (57.149995, -68.96805, 16.66875),
    ]]
    fillet(f9_edges, radius=F9_R)


solid = f1.part
